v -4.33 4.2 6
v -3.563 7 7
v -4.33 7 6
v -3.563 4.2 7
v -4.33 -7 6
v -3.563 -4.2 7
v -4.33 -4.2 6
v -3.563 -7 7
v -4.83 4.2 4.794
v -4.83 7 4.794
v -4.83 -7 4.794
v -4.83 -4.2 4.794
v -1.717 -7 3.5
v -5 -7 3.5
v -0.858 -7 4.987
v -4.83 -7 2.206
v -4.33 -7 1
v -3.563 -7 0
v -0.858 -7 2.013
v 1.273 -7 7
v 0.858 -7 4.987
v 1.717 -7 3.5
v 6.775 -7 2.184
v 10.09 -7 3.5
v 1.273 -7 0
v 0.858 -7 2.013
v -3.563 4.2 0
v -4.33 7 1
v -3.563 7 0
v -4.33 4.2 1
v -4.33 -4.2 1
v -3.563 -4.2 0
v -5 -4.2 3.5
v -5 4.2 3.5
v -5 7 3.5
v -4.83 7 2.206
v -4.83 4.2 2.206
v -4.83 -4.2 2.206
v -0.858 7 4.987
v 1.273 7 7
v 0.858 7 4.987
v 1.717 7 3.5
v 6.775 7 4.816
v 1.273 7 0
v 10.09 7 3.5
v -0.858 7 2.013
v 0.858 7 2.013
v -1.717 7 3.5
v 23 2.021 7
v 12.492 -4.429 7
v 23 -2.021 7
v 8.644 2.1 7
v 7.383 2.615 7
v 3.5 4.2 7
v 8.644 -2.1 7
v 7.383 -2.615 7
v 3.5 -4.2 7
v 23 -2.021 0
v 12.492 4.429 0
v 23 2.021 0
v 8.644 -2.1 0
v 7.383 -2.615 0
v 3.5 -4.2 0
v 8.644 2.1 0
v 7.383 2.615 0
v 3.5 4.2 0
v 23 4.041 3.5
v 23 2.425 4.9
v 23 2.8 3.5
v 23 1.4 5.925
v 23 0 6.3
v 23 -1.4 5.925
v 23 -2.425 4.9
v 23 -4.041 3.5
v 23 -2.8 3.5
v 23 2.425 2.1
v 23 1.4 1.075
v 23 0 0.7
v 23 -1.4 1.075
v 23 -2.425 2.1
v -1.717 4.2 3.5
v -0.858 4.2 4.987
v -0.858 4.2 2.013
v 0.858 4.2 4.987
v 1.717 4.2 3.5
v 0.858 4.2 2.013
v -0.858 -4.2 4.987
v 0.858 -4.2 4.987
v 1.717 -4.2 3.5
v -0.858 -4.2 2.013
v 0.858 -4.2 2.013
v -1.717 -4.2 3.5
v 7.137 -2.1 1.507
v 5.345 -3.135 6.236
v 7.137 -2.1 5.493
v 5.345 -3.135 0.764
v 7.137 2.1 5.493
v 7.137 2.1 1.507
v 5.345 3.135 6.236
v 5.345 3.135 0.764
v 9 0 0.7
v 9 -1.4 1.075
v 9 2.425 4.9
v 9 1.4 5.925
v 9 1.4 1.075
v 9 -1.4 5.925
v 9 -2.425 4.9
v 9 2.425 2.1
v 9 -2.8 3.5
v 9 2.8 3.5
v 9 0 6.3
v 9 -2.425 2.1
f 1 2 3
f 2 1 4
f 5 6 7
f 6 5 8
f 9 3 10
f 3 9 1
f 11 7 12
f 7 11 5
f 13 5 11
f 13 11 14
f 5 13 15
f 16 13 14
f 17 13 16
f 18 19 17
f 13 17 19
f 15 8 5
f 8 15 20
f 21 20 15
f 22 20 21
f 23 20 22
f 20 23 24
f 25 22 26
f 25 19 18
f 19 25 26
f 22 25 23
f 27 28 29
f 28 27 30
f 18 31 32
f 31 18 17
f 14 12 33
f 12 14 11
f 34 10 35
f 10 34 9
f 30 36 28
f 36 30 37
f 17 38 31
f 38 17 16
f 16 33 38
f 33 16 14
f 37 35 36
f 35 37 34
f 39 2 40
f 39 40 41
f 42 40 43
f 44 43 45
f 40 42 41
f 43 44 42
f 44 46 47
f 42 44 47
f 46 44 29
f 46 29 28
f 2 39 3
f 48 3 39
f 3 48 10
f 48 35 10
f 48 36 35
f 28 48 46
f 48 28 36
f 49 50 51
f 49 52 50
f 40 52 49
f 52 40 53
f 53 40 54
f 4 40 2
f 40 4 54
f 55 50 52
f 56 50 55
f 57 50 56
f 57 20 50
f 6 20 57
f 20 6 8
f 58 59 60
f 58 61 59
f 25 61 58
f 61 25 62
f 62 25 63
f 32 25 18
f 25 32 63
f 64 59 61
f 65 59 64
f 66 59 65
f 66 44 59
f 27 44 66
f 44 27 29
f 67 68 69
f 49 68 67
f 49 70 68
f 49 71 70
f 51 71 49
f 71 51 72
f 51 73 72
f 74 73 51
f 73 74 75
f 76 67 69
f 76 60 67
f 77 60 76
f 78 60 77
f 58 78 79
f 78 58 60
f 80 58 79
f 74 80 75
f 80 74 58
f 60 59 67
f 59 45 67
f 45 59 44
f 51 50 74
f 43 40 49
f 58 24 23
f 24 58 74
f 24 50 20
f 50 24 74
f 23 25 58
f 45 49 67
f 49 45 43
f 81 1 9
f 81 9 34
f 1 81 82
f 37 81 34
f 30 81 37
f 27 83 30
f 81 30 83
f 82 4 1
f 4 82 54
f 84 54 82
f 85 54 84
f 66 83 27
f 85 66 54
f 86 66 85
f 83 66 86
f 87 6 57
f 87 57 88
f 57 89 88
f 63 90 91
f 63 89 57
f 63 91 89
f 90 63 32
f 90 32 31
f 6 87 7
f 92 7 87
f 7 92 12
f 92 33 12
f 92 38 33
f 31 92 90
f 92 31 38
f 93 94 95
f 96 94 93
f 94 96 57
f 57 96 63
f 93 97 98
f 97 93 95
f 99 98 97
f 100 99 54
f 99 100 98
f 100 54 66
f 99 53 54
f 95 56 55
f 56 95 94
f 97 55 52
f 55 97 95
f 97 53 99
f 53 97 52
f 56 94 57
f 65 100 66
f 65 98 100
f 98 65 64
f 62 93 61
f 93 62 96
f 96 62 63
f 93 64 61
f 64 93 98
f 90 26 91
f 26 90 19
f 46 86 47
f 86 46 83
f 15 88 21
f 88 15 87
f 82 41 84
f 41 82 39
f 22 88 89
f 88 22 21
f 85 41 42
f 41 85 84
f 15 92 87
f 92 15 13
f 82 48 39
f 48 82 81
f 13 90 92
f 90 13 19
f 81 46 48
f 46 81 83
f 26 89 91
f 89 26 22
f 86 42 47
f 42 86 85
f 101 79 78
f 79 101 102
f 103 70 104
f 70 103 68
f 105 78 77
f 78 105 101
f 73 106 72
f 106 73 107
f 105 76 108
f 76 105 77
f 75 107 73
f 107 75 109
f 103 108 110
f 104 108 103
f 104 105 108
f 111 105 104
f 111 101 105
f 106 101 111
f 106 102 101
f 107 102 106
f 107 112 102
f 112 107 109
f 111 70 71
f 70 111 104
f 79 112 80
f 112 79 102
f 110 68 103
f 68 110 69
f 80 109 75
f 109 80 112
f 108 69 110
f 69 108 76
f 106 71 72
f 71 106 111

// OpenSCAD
// file: polyholes.scad
//
// Mendel90
//
// GNU GPL v2
// nop.head@gmail.com
// hydraraptor.blogspot.com
//
// See http://hydraraptor.blogspot.com/2011/02/polyholes.html
//
function sides(r) = max(round(4 *r),3);
function corrected_radius(r,n) = 0.1 + r / cos(180 / n);
function corrected_diameter(d) = 0.2 + d / cos(180 / sides(d / 2));

module poly_circle(r, center = false) {
    n = sides(r);
    circle(r = corrected_radius(r,n), $fn = n, center = center);
}

module poly_cylinder(r, h, center = false) {
    n = sides(r);
    cylinder(h = h, r = corrected_radius(r,n), $fn = n, center = center);
}

module poly_d_cylinder(r, center = false) {
    n = sides(r);
    r = corrected_radius(r,n);
    cylinder(h = h, r = r, $fn = n, center = center);
    translate([0, -r, 0])
        cube([r, 2 * r, h]);
}
// main file
use <polyholes.scad>
h = 7;
r = h/2 / cos(30);

module jaws() {
  difference() {
    union() {
      intersection () {
        rotate([90, 0, 0]) cylinder(r=5, h=14, center=true, $fn=24);
        translate([-4, 0, 0]) cube([10, 14, h], center=true);
      }
      intersection() {
        translate([10, 0, 0]) cube([26, 14, h], center=true);
        translate([10, 0, 0]) rotate([0, 90, 0]) rotate([0, 0, 30])
          cylinder(r1=10, r2=r, h=26, center=true, $fn=6);
      }
    }
    translate([-1.5, 0, 0]) cube([10, 8.4, 10], center=true);
    translate([3.5, 0, 0]) rotate([0, 0, 30])
      cylinder(r=4.2, h=10, center=true, $fn=6);
    translate([4, 0, 4]) rotate([0, 45, 0])
      rotate([0, 0, 30]) cylinder(r=4.2, h=8, center=true, $fn=6);
    translate([4, 0, -4]) rotate([0, -45, 0])
      rotate([0, 0, 30]) cylinder(r=4.2, h=8, center=true, $fn=6);
    rotate([90, 0, 0]) poly_cylinder(r=1.4, h=40, center=true, $fn=12);
    translate([19, 0, 0]) rotate([0, 90, 0])
      cylinder(r=2.8, h=20, center=true, $fn=12);
  }
}

translate([0, 0, h/2]) jaws();
